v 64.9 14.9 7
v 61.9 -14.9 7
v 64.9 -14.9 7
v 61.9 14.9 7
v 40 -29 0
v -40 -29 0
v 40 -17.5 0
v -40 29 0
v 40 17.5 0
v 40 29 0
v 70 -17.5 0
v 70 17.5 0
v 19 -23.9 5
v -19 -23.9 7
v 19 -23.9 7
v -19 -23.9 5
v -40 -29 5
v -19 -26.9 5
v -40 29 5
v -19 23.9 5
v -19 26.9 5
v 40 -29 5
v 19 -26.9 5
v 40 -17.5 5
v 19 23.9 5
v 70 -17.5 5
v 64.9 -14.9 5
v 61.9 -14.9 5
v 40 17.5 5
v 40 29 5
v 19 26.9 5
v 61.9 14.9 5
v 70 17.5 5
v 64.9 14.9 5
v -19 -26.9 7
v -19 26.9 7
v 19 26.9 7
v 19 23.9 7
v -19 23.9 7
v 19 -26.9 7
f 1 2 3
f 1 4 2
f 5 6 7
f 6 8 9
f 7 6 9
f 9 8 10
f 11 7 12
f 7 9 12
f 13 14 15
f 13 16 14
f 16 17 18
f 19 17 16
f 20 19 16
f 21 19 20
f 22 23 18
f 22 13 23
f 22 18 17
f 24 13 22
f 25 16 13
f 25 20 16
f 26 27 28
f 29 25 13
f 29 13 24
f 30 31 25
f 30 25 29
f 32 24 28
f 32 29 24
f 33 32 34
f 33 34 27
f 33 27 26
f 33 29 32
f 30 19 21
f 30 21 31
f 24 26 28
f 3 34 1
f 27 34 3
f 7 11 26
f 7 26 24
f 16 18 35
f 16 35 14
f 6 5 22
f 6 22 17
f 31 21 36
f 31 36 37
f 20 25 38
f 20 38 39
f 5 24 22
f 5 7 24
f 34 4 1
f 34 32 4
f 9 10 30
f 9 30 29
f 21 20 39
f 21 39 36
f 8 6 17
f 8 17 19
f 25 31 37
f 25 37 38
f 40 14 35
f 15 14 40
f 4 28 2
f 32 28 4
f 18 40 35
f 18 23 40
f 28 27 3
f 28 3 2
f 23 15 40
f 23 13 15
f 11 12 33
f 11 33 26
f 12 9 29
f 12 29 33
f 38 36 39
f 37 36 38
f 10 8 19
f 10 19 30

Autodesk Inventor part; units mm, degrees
ref_plane "YZ Plane" through (0, 0, 0) normal (1, 0, 0) x (0, 1, 0)
ref_plane "XZ Plane" through (0, 0, 0) normal (0, 1, 0) x (-1, 0, 0)
ref_plane "XY Plane" through (0, 0, 0) normal (0, 0, 1) x (1, 0, 0)
sketch "Sketch1" plane through (0, 0, 0) normal (0, 0, 1) x (1, 0, 0)
  line L0 (-40, -29) -> (-40, 29)
  line L1 (-40, 29) -> (40, 29)
  line L2 (40, 29) -> (40, -29)
  line L3 (40, -29) -> (-40, -29)
  line L4 (-40, -29) -> (40, 29) construction
  line L5 (-40, 29) -> (40, -29) construction
  line L6 (40, 17.5) -> (70, 17.5)
  line L7 (70, 17.5) -> (70, -17.5)
  line L8 (70, -17.5) -> (40, -17.5)
  line L9 (40, -17.5) -> (40, 17.5)
  point P0 (0, 0)
  dimension "d0" = 58
  dimension "d1" = 80
  dimension "d2" = 30
  dimension "d3" = 35
sketch "Sketch2" plane through (0, 0, 0) normal (0, 0, 1) x (1, 0, 0)
  point P0 (0, 0)
extrude "Extrusion1" add sketch "Sketch1" along normal blind 5
sketch "Sketch3" plane through (0, 0, 5) normal (0, 0, 1) x (1, 0, 0)
  line L0 (-19, 26.9) -> (19, 26.9)
  line L1 (19, 26.9) -> (19, 23.9)
  line L2 (19, 23.9) -> (-19, 23.9)
  line L3 (-19, 23.9) -> (-19, 26.9)
  line L4 (-19, -23.9) -> (19, -23.9)
  line L5 (19, -23.9) -> (19, -26.9)
  line L6 (19, -26.9) -> (-19, -26.9)
  line L7 (-19, -26.9) -> (-19, -23.9)
  line L8 (61.9, 14.9) -> (64.9, 14.9)
  line L9 (64.9, 14.9) -> (64.9, -14.9)
  line L10 (64.9, -14.9) -> (61.9, -14.9)
  line L11 (61.9, -14.9) -> (61.9, 14.9)
  line L12 (40, 29) -> (-40, 29) projected
  line L13 (-40, 29) -> (-40, -29) projected
  line L14 (40, 17.5) -> (40, 29) projected
  line L15 (-40, -29) -> (40, -29) projected
  line L16 (40, -29) -> (40, -17.5) projected
  line L17 (70, -17.5) -> (70, 17.5) projected
  line L18 (70, 17.5) -> (40, 17.5) projected
  line L19 (40, -17.5) -> (70, -17.5) projected
  point P0 (0, 0)
  dimension "d6" = 2.1
  dimension "d7" = 3
  dimension "d8" = 21
  dimension "d9" = 21
  dimension "d10" = 2.1
  dimension "d11" = 21
  dimension "d12" = 21
  dimension "d13" = 3
  dimension "d14" = 5.1
  dimension "d15" = 2.6
  dimension "d16" = 2.6
  dimension "d17" = 3
extrude "Extrusion2" add sketch "Sketch3" along normal blind 2 contours L0 L1 L2 L3 | L4 L5 L6 L7 | L8 L9 L10 L11
properties part number "CageV5 Lid"
